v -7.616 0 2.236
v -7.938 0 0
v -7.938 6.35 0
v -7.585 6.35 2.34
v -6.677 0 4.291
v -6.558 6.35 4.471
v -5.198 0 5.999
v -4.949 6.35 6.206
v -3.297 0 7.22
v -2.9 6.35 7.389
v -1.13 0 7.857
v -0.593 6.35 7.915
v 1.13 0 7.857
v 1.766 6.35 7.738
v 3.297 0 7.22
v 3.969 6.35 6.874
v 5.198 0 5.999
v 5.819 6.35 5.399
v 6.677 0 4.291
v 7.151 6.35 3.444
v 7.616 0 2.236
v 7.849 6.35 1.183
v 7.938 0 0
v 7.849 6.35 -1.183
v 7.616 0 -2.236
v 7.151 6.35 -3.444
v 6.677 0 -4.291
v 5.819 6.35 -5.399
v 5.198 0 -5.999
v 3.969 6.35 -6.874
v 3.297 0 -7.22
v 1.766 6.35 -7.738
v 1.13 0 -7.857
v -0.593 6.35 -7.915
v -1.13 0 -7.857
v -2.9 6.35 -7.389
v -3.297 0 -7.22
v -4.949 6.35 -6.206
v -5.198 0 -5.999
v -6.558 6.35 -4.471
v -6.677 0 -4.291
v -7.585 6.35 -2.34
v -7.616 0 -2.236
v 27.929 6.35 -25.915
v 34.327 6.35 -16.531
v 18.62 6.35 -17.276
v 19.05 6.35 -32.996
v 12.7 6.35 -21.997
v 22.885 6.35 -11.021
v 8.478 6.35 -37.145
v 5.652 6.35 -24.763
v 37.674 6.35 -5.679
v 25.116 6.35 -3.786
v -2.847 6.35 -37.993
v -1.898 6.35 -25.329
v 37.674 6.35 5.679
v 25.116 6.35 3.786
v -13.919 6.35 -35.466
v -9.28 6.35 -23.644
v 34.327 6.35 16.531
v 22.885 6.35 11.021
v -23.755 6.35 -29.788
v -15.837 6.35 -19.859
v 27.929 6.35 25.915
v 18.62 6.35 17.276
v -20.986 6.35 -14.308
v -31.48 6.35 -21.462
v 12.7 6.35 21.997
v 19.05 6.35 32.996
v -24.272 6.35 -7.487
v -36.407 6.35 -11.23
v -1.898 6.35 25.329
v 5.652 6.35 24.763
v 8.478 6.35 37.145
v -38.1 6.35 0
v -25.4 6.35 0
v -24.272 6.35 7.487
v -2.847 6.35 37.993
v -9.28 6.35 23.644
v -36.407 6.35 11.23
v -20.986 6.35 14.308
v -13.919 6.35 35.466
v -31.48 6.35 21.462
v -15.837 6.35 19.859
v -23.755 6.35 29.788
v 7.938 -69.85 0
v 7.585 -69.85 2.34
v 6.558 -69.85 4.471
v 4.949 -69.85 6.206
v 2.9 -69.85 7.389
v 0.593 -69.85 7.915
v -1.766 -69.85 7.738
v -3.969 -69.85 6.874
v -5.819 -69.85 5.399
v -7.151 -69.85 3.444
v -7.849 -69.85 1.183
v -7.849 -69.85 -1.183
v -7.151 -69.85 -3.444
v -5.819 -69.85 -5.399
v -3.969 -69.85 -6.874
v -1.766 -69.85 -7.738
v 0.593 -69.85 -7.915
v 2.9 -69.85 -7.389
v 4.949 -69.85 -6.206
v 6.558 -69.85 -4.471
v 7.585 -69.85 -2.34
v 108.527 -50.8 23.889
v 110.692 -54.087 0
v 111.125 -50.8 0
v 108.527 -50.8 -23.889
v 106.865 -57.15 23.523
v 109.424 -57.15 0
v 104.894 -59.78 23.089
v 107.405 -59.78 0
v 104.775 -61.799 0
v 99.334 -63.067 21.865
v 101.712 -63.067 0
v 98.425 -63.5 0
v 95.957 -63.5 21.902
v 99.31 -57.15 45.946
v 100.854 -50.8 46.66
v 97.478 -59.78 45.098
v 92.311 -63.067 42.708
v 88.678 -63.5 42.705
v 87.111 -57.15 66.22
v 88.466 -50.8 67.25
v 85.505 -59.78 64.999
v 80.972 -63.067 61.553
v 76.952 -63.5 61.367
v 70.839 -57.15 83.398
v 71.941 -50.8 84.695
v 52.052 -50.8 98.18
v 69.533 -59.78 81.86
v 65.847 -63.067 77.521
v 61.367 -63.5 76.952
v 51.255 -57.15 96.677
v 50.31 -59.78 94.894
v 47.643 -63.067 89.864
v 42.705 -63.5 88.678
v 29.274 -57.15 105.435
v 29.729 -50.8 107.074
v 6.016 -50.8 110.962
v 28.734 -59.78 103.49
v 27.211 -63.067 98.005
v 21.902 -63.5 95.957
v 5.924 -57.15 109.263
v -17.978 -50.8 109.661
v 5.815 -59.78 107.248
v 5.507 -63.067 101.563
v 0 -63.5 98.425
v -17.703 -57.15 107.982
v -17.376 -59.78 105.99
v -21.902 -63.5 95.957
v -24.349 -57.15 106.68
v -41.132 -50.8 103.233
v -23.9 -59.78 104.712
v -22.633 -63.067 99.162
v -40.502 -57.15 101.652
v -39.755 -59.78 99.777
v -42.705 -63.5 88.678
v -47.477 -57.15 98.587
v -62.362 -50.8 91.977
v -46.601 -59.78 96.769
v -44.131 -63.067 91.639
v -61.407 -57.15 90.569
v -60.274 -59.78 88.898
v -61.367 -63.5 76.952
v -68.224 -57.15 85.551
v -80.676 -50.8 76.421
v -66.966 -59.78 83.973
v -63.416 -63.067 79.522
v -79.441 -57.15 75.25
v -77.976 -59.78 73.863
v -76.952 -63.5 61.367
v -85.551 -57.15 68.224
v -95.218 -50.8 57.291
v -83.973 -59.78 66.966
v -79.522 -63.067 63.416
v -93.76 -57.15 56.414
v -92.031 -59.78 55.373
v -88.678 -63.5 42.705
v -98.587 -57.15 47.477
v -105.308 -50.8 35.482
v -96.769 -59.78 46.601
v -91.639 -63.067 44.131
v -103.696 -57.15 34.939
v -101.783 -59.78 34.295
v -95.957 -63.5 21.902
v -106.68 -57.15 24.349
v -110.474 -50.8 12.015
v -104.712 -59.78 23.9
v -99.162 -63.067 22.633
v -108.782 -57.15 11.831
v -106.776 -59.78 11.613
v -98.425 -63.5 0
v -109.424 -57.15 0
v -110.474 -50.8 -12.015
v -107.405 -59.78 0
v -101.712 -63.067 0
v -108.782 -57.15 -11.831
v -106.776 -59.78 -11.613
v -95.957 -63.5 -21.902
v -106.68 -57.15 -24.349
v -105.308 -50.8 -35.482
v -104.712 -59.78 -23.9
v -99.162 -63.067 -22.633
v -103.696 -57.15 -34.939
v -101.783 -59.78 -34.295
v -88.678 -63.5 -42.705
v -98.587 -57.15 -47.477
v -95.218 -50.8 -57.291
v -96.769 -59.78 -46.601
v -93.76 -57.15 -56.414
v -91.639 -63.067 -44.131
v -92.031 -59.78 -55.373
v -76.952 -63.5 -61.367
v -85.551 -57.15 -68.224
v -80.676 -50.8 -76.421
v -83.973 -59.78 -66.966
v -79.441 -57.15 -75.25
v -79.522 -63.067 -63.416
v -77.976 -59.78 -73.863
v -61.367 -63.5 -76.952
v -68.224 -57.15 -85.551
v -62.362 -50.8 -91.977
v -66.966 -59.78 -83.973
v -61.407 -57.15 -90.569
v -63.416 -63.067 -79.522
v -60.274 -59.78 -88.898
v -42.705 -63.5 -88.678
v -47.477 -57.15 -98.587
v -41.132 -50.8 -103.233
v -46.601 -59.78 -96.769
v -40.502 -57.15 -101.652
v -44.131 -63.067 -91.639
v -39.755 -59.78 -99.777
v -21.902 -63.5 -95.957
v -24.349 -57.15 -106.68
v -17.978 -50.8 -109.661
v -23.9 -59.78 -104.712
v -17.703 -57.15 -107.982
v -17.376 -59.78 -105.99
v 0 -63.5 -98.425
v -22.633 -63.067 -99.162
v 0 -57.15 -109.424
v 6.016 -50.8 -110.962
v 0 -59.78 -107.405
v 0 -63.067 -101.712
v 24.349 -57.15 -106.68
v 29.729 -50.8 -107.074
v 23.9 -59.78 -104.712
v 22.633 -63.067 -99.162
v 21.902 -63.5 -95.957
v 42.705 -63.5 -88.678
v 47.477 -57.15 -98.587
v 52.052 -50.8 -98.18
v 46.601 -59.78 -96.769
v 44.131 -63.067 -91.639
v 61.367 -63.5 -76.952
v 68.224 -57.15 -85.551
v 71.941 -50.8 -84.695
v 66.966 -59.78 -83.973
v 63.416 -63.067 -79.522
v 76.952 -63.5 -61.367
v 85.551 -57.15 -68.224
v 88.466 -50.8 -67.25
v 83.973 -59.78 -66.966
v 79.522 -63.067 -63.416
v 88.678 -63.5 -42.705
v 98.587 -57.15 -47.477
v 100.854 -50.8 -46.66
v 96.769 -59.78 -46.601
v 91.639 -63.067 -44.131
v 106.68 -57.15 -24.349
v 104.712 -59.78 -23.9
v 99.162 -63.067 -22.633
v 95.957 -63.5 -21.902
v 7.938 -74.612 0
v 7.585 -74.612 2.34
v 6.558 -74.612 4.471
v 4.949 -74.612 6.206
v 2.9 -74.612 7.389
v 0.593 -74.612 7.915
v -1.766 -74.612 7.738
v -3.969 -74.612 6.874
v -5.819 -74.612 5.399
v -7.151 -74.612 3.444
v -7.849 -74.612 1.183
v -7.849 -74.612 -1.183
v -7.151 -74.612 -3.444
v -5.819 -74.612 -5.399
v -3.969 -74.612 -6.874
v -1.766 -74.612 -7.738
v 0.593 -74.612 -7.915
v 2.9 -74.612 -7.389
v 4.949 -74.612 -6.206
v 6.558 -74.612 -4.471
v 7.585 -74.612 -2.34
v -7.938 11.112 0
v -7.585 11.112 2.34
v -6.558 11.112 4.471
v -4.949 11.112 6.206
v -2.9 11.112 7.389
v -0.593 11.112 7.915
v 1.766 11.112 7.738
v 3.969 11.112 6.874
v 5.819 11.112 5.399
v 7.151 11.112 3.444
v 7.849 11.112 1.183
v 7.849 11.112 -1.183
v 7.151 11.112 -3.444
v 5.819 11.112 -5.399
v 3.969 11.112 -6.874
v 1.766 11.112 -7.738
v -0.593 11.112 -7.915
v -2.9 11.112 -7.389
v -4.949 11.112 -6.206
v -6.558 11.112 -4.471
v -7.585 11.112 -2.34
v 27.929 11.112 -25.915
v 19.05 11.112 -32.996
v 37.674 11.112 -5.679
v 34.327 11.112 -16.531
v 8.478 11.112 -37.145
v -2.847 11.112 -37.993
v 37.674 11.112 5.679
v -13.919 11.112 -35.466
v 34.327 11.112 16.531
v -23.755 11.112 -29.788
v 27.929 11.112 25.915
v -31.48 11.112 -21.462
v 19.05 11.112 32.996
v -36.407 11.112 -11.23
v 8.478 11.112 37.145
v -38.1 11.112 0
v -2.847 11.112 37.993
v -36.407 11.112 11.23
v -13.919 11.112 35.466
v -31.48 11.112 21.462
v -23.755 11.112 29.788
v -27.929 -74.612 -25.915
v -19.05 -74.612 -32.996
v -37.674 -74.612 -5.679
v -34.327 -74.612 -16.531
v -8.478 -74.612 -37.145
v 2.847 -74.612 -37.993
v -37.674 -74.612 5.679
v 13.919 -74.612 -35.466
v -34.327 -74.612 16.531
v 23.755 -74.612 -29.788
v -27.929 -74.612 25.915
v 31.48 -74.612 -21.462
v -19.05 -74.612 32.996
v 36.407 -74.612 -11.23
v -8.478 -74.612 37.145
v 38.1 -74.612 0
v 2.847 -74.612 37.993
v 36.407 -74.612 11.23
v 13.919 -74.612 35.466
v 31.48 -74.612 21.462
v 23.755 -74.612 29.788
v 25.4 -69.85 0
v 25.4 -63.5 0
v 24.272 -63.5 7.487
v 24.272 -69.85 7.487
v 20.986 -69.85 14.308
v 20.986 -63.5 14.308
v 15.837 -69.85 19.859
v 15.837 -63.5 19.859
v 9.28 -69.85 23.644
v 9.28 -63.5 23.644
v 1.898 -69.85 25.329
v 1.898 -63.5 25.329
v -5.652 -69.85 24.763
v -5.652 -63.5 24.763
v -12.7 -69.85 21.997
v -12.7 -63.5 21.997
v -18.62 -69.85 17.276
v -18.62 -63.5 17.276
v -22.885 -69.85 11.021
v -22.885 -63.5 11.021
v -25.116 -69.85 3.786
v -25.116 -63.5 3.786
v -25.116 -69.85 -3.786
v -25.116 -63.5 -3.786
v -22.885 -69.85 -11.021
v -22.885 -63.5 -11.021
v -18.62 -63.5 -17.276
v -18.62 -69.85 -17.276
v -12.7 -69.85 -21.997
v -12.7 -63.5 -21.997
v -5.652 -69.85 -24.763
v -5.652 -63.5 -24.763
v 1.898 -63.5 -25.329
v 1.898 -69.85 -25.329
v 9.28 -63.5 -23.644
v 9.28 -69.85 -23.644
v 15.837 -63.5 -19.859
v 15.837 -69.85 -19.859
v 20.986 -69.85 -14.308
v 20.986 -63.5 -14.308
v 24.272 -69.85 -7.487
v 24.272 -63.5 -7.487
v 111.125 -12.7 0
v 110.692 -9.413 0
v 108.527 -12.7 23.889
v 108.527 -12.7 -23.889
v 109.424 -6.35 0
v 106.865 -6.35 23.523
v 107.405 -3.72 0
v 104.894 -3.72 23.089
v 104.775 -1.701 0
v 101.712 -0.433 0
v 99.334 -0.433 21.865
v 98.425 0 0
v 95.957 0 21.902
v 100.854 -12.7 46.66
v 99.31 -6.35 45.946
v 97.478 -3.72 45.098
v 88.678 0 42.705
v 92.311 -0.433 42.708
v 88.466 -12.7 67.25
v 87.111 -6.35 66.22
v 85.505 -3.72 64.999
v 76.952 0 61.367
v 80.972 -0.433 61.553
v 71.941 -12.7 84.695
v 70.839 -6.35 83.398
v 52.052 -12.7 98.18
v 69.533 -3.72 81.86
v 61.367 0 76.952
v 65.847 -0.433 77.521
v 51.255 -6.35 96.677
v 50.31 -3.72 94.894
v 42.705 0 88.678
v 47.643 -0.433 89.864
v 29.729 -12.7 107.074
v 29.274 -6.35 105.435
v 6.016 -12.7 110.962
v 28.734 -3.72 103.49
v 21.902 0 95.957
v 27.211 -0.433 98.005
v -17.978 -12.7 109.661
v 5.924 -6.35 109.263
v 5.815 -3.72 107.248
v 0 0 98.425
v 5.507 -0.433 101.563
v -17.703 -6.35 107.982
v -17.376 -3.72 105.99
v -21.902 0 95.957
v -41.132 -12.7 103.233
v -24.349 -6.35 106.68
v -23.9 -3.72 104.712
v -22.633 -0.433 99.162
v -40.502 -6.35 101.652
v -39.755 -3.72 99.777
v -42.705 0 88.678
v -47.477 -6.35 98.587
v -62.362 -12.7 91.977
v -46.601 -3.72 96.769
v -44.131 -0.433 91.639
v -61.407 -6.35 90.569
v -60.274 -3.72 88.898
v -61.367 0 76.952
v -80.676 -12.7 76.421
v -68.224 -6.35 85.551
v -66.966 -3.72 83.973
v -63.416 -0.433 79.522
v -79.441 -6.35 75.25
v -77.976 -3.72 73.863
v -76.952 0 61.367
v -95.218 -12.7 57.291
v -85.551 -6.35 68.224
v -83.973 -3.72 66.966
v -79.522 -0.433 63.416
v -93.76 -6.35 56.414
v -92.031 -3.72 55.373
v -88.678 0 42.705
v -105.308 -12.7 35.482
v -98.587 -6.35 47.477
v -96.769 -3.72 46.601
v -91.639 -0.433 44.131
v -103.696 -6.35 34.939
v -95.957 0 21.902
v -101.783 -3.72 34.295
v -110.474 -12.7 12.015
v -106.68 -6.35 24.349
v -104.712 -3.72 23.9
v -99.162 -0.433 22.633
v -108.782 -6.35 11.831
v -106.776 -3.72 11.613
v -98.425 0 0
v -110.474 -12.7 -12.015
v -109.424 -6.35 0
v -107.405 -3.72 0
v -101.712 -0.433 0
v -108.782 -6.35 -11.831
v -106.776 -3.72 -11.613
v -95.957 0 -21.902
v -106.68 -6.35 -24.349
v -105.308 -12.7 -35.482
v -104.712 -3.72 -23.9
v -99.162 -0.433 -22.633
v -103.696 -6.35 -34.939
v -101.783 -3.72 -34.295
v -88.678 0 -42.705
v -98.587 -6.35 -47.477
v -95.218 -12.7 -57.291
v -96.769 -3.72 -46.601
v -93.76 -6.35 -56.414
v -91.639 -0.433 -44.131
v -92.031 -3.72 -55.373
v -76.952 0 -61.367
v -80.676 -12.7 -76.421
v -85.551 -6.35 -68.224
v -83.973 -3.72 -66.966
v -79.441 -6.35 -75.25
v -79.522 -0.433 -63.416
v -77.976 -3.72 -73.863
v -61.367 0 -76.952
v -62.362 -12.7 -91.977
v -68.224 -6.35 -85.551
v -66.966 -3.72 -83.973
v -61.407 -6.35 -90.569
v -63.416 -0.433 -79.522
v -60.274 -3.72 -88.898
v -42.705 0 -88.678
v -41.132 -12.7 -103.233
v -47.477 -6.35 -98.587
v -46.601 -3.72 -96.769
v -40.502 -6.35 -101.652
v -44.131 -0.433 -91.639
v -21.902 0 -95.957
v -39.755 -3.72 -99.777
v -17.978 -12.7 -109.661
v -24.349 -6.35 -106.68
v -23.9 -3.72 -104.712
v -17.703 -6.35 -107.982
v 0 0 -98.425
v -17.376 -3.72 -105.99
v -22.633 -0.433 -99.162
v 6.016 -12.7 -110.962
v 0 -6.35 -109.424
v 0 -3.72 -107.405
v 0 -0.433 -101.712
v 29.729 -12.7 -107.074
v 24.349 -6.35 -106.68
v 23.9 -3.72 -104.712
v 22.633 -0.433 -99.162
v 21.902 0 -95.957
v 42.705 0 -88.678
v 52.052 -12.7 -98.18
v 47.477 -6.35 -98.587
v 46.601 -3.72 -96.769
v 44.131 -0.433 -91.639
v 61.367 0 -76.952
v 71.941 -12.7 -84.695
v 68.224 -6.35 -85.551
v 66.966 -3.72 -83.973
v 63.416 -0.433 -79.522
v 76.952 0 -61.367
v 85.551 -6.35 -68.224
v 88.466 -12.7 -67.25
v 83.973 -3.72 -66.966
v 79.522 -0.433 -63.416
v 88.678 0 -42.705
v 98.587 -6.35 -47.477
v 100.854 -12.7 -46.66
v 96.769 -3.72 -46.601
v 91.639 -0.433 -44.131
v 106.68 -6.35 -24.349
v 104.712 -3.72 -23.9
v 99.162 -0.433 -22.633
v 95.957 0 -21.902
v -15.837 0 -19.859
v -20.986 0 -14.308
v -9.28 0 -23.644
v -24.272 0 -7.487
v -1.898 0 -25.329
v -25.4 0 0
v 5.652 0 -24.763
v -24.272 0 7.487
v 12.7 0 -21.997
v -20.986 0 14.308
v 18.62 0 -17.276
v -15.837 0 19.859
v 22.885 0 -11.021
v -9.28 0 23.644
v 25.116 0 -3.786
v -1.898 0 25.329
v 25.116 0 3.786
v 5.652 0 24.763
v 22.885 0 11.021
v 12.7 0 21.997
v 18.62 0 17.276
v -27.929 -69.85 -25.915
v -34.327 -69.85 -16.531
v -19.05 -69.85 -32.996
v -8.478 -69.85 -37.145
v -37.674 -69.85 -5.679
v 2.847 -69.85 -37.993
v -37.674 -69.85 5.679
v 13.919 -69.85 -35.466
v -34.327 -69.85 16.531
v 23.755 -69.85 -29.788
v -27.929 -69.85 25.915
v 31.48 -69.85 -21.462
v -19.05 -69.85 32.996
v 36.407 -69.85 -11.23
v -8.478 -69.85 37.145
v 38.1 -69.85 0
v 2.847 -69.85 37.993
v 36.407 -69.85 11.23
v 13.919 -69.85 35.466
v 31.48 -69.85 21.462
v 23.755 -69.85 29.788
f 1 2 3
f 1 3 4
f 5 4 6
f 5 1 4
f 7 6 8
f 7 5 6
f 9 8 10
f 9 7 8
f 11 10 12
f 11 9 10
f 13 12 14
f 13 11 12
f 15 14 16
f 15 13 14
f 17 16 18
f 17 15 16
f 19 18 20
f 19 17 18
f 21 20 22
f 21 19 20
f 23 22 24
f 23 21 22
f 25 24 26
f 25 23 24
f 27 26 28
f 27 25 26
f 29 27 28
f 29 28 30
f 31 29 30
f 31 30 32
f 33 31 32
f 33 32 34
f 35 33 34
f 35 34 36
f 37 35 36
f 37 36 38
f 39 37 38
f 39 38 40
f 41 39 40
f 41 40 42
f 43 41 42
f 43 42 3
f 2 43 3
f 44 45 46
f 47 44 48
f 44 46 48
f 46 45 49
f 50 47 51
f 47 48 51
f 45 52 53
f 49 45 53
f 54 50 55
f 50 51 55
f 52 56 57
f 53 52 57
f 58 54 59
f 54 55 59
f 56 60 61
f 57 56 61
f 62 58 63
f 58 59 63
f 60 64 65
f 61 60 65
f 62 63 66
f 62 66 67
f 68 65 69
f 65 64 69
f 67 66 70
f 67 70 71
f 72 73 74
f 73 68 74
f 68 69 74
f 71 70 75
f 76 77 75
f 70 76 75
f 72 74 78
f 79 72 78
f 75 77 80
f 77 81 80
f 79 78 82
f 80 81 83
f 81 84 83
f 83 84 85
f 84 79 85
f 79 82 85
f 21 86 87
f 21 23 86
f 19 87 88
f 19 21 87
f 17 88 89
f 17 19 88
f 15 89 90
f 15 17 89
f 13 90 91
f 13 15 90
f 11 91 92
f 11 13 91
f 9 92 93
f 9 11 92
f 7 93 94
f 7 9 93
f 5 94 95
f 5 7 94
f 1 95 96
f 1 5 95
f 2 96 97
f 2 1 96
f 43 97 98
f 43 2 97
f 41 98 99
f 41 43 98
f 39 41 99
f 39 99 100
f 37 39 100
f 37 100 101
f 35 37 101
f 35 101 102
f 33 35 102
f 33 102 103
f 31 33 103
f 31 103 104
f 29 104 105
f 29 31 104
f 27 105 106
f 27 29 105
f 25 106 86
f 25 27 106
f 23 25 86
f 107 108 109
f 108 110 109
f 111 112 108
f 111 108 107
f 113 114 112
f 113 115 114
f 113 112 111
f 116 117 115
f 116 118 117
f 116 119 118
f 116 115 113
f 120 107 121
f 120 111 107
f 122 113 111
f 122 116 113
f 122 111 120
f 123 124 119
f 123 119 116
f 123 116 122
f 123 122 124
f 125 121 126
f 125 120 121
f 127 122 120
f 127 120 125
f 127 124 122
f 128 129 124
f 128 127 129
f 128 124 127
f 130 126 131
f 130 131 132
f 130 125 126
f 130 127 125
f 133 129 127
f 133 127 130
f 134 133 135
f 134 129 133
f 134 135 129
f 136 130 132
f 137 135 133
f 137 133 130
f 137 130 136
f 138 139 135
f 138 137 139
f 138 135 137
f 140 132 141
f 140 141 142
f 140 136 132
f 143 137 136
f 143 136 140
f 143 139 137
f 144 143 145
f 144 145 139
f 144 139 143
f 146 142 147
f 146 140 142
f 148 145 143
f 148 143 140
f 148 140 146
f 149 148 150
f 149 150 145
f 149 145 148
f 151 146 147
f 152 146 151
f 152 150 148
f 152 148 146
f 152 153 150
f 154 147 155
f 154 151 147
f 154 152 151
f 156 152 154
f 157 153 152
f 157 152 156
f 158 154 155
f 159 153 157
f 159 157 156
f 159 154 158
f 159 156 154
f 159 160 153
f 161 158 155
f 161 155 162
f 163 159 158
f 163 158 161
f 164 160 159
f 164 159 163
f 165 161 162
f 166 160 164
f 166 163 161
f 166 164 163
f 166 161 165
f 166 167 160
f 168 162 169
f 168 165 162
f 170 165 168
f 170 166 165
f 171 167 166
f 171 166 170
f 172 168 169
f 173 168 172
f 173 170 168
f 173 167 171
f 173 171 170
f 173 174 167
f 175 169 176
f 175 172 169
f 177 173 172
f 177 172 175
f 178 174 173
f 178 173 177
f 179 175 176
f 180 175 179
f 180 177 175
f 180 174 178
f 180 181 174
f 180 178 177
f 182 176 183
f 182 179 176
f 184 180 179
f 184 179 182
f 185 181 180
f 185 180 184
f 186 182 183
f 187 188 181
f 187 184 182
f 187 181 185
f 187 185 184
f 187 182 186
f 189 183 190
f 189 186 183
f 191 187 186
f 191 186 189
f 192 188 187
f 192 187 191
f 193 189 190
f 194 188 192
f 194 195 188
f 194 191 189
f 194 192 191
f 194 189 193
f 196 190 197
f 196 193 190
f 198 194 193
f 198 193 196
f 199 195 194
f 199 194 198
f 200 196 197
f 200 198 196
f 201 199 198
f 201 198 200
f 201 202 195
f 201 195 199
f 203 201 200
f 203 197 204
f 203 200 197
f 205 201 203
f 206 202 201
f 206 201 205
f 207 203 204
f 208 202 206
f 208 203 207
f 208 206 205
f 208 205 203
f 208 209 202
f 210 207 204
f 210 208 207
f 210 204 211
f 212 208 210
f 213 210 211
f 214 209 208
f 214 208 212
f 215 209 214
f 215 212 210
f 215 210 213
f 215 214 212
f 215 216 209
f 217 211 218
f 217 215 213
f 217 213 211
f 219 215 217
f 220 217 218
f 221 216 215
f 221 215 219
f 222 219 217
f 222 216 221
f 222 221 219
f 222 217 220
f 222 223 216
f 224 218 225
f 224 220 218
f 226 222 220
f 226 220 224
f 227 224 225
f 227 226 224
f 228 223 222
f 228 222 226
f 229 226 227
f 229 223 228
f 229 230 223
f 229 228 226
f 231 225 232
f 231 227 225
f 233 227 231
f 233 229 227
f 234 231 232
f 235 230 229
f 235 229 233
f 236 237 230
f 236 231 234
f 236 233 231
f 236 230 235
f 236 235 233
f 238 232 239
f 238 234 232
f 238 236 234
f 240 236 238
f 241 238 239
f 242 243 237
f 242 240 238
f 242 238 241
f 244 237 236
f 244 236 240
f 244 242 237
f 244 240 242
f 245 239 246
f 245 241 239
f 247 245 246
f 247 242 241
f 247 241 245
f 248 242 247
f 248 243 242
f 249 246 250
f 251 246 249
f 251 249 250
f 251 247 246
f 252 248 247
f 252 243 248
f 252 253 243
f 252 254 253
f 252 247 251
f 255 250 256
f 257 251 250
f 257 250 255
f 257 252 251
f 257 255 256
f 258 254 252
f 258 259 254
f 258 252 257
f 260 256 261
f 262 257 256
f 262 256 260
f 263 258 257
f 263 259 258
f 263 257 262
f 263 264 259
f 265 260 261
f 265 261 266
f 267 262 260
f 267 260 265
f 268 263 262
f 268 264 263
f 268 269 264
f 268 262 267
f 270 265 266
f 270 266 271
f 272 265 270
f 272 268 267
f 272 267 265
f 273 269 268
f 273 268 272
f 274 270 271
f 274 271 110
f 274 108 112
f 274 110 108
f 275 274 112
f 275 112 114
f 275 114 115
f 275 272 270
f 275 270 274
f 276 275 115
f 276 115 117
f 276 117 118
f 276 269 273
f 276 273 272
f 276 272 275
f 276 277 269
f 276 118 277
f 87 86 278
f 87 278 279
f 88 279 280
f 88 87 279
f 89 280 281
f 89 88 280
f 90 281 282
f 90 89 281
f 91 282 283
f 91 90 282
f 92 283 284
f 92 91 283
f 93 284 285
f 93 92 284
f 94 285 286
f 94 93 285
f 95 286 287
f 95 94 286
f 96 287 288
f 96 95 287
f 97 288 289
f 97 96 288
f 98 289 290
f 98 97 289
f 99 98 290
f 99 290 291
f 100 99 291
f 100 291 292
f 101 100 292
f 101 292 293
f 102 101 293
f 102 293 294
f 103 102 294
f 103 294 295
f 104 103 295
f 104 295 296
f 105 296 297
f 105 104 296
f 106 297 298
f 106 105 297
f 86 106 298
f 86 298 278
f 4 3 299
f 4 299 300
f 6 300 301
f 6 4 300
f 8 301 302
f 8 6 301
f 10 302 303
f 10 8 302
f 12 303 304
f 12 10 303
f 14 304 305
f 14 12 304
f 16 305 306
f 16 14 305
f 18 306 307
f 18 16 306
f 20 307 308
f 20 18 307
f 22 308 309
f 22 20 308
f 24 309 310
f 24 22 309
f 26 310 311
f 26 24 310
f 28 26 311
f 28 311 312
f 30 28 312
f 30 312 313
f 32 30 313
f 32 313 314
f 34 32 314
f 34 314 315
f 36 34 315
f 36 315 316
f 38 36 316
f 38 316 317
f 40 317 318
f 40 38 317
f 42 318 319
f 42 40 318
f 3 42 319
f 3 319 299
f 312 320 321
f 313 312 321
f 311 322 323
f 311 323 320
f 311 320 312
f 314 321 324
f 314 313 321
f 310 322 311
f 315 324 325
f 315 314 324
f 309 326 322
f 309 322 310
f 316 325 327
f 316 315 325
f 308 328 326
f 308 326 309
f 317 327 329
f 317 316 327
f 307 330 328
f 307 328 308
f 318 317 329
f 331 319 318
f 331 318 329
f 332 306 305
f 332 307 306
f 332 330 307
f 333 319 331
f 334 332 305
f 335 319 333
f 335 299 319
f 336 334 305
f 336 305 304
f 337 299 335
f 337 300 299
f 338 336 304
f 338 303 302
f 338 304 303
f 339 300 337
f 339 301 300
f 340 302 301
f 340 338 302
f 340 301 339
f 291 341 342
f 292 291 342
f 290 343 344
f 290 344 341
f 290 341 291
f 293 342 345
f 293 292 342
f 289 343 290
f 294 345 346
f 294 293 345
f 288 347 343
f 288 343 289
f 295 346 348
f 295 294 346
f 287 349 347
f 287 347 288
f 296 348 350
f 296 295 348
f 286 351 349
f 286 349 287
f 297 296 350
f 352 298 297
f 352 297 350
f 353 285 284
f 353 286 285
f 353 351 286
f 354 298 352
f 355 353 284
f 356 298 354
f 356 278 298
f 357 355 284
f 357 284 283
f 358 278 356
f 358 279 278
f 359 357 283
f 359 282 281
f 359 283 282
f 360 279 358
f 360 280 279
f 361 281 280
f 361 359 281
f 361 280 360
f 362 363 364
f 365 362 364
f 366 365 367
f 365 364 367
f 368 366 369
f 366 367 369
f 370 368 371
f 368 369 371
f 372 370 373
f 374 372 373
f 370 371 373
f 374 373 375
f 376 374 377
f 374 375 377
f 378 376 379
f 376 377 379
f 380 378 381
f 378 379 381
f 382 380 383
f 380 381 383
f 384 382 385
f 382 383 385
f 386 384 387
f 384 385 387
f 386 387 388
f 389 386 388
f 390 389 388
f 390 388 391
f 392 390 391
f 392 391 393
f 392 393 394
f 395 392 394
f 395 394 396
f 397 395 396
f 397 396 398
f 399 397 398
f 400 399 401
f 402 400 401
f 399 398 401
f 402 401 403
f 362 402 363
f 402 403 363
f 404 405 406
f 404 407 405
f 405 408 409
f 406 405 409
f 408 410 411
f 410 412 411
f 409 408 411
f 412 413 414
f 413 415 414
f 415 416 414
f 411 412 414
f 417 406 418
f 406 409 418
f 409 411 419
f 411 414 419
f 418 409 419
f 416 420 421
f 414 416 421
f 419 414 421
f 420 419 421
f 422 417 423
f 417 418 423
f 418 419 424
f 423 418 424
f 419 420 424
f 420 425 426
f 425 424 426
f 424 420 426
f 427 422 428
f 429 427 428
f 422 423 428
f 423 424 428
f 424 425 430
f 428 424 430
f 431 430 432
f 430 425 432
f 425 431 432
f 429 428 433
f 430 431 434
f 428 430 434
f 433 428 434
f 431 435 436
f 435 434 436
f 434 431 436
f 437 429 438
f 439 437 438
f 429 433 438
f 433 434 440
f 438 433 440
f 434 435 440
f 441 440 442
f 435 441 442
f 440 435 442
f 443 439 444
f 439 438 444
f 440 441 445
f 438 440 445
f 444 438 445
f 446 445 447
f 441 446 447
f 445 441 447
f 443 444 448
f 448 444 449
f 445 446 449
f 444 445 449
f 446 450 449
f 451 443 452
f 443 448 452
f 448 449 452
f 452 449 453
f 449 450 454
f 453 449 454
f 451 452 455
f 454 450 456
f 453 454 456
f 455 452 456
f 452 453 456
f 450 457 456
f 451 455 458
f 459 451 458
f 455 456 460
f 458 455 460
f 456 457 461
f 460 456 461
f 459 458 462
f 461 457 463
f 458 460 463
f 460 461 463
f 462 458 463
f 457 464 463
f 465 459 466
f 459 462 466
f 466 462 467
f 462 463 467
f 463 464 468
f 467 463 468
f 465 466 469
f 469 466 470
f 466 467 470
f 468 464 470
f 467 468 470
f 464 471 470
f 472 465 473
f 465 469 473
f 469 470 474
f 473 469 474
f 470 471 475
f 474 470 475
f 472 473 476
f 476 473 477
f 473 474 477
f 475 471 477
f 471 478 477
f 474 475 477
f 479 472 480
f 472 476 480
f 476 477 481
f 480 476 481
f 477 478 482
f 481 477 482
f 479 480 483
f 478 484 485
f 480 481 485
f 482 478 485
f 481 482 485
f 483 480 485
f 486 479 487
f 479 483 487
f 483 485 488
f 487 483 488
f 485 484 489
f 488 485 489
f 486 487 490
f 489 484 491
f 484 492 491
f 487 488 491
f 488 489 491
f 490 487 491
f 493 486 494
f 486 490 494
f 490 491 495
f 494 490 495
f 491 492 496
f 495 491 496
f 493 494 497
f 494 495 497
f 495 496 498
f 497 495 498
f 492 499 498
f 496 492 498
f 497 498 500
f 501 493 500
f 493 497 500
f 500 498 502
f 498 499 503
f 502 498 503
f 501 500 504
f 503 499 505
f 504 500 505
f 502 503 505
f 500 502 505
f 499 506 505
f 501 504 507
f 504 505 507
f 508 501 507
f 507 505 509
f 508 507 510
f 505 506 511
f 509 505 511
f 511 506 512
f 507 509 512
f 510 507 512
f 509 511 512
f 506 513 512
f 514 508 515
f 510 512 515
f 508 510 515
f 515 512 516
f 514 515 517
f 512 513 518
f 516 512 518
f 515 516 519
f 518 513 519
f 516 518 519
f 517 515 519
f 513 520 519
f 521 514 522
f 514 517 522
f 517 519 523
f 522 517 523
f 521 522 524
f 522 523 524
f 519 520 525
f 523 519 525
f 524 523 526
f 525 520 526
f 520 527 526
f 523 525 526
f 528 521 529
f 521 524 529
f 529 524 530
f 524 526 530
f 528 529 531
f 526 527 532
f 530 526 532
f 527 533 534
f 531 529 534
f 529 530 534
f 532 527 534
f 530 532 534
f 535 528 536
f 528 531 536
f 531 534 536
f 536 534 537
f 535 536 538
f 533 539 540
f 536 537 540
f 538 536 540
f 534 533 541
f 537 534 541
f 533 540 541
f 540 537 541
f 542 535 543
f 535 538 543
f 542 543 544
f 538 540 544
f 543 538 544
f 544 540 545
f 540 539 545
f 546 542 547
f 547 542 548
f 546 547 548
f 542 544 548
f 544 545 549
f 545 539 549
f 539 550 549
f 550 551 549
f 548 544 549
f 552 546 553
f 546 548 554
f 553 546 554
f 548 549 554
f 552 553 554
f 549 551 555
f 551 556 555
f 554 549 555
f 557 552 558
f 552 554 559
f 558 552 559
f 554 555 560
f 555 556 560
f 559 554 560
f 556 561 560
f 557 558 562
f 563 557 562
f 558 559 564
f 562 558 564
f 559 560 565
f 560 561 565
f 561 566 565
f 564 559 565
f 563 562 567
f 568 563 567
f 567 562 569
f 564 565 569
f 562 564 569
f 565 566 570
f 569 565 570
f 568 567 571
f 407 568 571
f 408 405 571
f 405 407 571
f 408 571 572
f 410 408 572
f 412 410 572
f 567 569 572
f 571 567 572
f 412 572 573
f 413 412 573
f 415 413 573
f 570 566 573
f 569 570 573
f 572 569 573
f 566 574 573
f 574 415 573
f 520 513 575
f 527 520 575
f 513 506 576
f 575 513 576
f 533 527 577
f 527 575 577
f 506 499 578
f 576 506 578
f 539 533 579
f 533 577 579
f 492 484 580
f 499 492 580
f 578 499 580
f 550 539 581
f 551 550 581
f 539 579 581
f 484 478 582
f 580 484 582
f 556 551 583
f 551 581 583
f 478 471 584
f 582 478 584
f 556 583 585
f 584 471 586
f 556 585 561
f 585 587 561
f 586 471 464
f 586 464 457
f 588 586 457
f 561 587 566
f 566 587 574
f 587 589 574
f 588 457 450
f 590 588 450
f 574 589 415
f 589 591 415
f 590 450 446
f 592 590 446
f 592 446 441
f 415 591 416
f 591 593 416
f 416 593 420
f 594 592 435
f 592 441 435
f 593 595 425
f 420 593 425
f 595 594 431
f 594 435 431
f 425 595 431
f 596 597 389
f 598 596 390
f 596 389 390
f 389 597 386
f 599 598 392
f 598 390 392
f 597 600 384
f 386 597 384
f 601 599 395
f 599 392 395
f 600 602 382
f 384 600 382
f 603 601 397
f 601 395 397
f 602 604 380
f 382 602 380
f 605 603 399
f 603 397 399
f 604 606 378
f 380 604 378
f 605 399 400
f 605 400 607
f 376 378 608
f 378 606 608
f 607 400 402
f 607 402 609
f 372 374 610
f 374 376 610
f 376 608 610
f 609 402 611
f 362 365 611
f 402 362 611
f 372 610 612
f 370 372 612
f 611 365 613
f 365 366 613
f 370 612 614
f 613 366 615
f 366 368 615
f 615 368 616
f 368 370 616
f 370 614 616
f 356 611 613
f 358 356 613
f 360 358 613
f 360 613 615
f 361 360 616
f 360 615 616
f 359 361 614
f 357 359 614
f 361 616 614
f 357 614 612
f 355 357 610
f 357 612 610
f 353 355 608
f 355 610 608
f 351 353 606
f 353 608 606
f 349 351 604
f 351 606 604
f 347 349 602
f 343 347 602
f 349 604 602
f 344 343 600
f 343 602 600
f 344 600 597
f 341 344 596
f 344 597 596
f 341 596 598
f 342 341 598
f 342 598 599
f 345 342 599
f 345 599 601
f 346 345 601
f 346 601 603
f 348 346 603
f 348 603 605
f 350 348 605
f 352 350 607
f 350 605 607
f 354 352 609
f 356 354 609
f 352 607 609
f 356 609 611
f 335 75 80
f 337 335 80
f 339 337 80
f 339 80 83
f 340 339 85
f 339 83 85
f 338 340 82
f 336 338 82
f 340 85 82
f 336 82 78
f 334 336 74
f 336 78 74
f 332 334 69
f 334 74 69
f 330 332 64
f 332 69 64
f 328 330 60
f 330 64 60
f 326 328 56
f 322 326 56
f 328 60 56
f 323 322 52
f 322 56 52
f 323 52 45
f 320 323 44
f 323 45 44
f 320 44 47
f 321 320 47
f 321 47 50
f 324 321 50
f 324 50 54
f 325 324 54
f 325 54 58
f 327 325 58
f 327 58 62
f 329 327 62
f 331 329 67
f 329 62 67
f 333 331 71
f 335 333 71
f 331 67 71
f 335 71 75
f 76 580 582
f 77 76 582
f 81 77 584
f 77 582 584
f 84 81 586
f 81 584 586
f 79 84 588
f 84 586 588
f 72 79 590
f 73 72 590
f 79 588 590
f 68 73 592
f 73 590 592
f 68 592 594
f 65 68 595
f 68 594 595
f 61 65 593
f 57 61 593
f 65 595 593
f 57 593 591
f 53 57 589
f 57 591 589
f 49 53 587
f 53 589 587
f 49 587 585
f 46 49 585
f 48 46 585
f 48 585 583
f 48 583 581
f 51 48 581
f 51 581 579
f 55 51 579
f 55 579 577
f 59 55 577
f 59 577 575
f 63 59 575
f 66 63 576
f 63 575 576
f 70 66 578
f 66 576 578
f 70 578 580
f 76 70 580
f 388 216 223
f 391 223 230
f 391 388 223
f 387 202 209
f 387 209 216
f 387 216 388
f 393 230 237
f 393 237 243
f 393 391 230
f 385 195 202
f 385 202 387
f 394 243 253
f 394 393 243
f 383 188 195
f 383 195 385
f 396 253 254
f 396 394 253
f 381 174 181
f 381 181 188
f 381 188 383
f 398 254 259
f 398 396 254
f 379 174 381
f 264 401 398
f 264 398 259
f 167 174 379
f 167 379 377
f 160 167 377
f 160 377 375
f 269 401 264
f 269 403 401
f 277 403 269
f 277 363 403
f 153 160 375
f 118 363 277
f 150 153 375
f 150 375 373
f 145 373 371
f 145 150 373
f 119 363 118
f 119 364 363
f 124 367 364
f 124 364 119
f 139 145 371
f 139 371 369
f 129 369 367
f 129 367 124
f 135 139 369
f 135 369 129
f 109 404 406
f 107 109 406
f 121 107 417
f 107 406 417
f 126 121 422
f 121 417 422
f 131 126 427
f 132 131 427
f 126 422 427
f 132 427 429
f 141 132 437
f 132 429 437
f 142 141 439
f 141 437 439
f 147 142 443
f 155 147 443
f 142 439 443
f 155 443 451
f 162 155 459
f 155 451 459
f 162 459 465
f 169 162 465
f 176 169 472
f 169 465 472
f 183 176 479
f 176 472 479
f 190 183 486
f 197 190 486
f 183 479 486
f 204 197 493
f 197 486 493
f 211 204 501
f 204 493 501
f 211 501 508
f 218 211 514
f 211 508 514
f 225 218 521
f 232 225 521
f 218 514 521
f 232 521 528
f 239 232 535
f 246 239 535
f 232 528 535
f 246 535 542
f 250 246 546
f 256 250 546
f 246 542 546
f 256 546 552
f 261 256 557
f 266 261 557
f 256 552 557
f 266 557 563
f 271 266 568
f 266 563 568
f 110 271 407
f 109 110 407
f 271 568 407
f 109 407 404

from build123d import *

# Parameters (mm, degrees)
F0_R      = 111.125
F0_R_2    = 7.9375
F1_DEPTH  = 63.5
F2_R      = 12.7
F3_R      = 12.7
F4_R      = 25.4
F4_R_2    = 7.9375
F5_DEPTH  = 6.35
F6_R      = 38.1
F6_R_2    = 25.4
F7_DEPTH  = 4.7625
F8_R      = 25.4
F8_R_2    = 7.9375
F9_DEPTH  = 6.35
F10_R     = 38.1
F10_R_2   = 25.4
F11_DEPTH = 4.7625
F14_R     = 38.1
F14_R_2   = 25.4
F14_R_3   = 7.9375
F15_DEPTH = 4.7625
F16_R     = 38.1
F16_R_2   = 25.4
F16_R_3   = 7.9375
F17_DEPTH = 4.7625


with BuildPart() as f1:
    # F0 (on Front) → F1 (new body)
    with BuildSketch(Plane.XZ):
        Circle(F0_R)
        Circle(F0_R_2, mode=Mode.SUBTRACT)
    extrude(amount=F1_DEPTH)

    # F2
    f2_edges = [f1.edges().sort_by_distance(p)[0] for p in [
        (-111.125, -63.5, 0),
    ]]
    fillet(f2_edges, radius=F2_R)

    # F3
    f3_edges = [f1.edges().sort_by_distance(p)[0] for p in [
        (-111.125, 0, 0),
    ]]
    fillet(f3_edges, radius=F3_R)

    # F4 (on face) → F5 (join)
    with BuildSketch(Plane.XZ.offset(63.5)):
        Circle(F4_R)
        Circle(F4_R_2, mode=Mode.SUBTRACT)
    extrude(amount=F5_DEPTH)

    # F8 (on face) → F9 (join)
    with BuildSketch(Plane(origin=(0, 0, 0), x_dir=(-1, 0, 0), z_dir=(0, 1, 0))):
        Circle(F8_R)
        Circle(F8_R_2, mode=Mode.SUBTRACT)
    extrude(amount=F9_DEPTH)

    # F14 (on face) → F15 (join)
    with BuildSketch(Plane.XZ.offset(69.85)):
        Circle(F14_R)
        Circle(F14_R_2, mode=Mode.SUBTRACT)
        Circle(F14_R_2)
        Circle(F14_R_3, mode=Mode.SUBTRACT)
    extrude(amount=F15_DEPTH)

    # F16 (on face) → F17 (join)
    with BuildSketch(Plane(origin=(0, 6.35, 0), x_dir=(-1, 0, 0), z_dir=(0, 1, 0))):
        Circle(F16_R)
        Circle(F16_R_2, mode=Mode.SUBTRACT)
        Circle(F16_R_2)
        Circle(F16_R_3, mode=Mode.SUBTRACT)
    extrude(amount=F17_DEPTH)


with BuildPart() as f7:
    # F6 (on face) → F7 (new body)
    with BuildSketch(Plane.XZ.offset(69.85)):
        Circle(F6_R)
        Circle(F6_R_2, mode=Mode.SUBTRACT)
    extrude(amount=F7_DEPTH)


with BuildPart() as f11:
    # F10 (on face) → F11 (new body)
    with BuildSketch(Plane(origin=(0, 6.35, 0), x_dir=(-1, 0, 0), z_dir=(0, 1, 0))):
        Circle(F10_R)
        Circle(F10_R_2, mode=Mode.SUBTRACT)
    extrude(amount=F11_DEPTH)


solid = f1.part
